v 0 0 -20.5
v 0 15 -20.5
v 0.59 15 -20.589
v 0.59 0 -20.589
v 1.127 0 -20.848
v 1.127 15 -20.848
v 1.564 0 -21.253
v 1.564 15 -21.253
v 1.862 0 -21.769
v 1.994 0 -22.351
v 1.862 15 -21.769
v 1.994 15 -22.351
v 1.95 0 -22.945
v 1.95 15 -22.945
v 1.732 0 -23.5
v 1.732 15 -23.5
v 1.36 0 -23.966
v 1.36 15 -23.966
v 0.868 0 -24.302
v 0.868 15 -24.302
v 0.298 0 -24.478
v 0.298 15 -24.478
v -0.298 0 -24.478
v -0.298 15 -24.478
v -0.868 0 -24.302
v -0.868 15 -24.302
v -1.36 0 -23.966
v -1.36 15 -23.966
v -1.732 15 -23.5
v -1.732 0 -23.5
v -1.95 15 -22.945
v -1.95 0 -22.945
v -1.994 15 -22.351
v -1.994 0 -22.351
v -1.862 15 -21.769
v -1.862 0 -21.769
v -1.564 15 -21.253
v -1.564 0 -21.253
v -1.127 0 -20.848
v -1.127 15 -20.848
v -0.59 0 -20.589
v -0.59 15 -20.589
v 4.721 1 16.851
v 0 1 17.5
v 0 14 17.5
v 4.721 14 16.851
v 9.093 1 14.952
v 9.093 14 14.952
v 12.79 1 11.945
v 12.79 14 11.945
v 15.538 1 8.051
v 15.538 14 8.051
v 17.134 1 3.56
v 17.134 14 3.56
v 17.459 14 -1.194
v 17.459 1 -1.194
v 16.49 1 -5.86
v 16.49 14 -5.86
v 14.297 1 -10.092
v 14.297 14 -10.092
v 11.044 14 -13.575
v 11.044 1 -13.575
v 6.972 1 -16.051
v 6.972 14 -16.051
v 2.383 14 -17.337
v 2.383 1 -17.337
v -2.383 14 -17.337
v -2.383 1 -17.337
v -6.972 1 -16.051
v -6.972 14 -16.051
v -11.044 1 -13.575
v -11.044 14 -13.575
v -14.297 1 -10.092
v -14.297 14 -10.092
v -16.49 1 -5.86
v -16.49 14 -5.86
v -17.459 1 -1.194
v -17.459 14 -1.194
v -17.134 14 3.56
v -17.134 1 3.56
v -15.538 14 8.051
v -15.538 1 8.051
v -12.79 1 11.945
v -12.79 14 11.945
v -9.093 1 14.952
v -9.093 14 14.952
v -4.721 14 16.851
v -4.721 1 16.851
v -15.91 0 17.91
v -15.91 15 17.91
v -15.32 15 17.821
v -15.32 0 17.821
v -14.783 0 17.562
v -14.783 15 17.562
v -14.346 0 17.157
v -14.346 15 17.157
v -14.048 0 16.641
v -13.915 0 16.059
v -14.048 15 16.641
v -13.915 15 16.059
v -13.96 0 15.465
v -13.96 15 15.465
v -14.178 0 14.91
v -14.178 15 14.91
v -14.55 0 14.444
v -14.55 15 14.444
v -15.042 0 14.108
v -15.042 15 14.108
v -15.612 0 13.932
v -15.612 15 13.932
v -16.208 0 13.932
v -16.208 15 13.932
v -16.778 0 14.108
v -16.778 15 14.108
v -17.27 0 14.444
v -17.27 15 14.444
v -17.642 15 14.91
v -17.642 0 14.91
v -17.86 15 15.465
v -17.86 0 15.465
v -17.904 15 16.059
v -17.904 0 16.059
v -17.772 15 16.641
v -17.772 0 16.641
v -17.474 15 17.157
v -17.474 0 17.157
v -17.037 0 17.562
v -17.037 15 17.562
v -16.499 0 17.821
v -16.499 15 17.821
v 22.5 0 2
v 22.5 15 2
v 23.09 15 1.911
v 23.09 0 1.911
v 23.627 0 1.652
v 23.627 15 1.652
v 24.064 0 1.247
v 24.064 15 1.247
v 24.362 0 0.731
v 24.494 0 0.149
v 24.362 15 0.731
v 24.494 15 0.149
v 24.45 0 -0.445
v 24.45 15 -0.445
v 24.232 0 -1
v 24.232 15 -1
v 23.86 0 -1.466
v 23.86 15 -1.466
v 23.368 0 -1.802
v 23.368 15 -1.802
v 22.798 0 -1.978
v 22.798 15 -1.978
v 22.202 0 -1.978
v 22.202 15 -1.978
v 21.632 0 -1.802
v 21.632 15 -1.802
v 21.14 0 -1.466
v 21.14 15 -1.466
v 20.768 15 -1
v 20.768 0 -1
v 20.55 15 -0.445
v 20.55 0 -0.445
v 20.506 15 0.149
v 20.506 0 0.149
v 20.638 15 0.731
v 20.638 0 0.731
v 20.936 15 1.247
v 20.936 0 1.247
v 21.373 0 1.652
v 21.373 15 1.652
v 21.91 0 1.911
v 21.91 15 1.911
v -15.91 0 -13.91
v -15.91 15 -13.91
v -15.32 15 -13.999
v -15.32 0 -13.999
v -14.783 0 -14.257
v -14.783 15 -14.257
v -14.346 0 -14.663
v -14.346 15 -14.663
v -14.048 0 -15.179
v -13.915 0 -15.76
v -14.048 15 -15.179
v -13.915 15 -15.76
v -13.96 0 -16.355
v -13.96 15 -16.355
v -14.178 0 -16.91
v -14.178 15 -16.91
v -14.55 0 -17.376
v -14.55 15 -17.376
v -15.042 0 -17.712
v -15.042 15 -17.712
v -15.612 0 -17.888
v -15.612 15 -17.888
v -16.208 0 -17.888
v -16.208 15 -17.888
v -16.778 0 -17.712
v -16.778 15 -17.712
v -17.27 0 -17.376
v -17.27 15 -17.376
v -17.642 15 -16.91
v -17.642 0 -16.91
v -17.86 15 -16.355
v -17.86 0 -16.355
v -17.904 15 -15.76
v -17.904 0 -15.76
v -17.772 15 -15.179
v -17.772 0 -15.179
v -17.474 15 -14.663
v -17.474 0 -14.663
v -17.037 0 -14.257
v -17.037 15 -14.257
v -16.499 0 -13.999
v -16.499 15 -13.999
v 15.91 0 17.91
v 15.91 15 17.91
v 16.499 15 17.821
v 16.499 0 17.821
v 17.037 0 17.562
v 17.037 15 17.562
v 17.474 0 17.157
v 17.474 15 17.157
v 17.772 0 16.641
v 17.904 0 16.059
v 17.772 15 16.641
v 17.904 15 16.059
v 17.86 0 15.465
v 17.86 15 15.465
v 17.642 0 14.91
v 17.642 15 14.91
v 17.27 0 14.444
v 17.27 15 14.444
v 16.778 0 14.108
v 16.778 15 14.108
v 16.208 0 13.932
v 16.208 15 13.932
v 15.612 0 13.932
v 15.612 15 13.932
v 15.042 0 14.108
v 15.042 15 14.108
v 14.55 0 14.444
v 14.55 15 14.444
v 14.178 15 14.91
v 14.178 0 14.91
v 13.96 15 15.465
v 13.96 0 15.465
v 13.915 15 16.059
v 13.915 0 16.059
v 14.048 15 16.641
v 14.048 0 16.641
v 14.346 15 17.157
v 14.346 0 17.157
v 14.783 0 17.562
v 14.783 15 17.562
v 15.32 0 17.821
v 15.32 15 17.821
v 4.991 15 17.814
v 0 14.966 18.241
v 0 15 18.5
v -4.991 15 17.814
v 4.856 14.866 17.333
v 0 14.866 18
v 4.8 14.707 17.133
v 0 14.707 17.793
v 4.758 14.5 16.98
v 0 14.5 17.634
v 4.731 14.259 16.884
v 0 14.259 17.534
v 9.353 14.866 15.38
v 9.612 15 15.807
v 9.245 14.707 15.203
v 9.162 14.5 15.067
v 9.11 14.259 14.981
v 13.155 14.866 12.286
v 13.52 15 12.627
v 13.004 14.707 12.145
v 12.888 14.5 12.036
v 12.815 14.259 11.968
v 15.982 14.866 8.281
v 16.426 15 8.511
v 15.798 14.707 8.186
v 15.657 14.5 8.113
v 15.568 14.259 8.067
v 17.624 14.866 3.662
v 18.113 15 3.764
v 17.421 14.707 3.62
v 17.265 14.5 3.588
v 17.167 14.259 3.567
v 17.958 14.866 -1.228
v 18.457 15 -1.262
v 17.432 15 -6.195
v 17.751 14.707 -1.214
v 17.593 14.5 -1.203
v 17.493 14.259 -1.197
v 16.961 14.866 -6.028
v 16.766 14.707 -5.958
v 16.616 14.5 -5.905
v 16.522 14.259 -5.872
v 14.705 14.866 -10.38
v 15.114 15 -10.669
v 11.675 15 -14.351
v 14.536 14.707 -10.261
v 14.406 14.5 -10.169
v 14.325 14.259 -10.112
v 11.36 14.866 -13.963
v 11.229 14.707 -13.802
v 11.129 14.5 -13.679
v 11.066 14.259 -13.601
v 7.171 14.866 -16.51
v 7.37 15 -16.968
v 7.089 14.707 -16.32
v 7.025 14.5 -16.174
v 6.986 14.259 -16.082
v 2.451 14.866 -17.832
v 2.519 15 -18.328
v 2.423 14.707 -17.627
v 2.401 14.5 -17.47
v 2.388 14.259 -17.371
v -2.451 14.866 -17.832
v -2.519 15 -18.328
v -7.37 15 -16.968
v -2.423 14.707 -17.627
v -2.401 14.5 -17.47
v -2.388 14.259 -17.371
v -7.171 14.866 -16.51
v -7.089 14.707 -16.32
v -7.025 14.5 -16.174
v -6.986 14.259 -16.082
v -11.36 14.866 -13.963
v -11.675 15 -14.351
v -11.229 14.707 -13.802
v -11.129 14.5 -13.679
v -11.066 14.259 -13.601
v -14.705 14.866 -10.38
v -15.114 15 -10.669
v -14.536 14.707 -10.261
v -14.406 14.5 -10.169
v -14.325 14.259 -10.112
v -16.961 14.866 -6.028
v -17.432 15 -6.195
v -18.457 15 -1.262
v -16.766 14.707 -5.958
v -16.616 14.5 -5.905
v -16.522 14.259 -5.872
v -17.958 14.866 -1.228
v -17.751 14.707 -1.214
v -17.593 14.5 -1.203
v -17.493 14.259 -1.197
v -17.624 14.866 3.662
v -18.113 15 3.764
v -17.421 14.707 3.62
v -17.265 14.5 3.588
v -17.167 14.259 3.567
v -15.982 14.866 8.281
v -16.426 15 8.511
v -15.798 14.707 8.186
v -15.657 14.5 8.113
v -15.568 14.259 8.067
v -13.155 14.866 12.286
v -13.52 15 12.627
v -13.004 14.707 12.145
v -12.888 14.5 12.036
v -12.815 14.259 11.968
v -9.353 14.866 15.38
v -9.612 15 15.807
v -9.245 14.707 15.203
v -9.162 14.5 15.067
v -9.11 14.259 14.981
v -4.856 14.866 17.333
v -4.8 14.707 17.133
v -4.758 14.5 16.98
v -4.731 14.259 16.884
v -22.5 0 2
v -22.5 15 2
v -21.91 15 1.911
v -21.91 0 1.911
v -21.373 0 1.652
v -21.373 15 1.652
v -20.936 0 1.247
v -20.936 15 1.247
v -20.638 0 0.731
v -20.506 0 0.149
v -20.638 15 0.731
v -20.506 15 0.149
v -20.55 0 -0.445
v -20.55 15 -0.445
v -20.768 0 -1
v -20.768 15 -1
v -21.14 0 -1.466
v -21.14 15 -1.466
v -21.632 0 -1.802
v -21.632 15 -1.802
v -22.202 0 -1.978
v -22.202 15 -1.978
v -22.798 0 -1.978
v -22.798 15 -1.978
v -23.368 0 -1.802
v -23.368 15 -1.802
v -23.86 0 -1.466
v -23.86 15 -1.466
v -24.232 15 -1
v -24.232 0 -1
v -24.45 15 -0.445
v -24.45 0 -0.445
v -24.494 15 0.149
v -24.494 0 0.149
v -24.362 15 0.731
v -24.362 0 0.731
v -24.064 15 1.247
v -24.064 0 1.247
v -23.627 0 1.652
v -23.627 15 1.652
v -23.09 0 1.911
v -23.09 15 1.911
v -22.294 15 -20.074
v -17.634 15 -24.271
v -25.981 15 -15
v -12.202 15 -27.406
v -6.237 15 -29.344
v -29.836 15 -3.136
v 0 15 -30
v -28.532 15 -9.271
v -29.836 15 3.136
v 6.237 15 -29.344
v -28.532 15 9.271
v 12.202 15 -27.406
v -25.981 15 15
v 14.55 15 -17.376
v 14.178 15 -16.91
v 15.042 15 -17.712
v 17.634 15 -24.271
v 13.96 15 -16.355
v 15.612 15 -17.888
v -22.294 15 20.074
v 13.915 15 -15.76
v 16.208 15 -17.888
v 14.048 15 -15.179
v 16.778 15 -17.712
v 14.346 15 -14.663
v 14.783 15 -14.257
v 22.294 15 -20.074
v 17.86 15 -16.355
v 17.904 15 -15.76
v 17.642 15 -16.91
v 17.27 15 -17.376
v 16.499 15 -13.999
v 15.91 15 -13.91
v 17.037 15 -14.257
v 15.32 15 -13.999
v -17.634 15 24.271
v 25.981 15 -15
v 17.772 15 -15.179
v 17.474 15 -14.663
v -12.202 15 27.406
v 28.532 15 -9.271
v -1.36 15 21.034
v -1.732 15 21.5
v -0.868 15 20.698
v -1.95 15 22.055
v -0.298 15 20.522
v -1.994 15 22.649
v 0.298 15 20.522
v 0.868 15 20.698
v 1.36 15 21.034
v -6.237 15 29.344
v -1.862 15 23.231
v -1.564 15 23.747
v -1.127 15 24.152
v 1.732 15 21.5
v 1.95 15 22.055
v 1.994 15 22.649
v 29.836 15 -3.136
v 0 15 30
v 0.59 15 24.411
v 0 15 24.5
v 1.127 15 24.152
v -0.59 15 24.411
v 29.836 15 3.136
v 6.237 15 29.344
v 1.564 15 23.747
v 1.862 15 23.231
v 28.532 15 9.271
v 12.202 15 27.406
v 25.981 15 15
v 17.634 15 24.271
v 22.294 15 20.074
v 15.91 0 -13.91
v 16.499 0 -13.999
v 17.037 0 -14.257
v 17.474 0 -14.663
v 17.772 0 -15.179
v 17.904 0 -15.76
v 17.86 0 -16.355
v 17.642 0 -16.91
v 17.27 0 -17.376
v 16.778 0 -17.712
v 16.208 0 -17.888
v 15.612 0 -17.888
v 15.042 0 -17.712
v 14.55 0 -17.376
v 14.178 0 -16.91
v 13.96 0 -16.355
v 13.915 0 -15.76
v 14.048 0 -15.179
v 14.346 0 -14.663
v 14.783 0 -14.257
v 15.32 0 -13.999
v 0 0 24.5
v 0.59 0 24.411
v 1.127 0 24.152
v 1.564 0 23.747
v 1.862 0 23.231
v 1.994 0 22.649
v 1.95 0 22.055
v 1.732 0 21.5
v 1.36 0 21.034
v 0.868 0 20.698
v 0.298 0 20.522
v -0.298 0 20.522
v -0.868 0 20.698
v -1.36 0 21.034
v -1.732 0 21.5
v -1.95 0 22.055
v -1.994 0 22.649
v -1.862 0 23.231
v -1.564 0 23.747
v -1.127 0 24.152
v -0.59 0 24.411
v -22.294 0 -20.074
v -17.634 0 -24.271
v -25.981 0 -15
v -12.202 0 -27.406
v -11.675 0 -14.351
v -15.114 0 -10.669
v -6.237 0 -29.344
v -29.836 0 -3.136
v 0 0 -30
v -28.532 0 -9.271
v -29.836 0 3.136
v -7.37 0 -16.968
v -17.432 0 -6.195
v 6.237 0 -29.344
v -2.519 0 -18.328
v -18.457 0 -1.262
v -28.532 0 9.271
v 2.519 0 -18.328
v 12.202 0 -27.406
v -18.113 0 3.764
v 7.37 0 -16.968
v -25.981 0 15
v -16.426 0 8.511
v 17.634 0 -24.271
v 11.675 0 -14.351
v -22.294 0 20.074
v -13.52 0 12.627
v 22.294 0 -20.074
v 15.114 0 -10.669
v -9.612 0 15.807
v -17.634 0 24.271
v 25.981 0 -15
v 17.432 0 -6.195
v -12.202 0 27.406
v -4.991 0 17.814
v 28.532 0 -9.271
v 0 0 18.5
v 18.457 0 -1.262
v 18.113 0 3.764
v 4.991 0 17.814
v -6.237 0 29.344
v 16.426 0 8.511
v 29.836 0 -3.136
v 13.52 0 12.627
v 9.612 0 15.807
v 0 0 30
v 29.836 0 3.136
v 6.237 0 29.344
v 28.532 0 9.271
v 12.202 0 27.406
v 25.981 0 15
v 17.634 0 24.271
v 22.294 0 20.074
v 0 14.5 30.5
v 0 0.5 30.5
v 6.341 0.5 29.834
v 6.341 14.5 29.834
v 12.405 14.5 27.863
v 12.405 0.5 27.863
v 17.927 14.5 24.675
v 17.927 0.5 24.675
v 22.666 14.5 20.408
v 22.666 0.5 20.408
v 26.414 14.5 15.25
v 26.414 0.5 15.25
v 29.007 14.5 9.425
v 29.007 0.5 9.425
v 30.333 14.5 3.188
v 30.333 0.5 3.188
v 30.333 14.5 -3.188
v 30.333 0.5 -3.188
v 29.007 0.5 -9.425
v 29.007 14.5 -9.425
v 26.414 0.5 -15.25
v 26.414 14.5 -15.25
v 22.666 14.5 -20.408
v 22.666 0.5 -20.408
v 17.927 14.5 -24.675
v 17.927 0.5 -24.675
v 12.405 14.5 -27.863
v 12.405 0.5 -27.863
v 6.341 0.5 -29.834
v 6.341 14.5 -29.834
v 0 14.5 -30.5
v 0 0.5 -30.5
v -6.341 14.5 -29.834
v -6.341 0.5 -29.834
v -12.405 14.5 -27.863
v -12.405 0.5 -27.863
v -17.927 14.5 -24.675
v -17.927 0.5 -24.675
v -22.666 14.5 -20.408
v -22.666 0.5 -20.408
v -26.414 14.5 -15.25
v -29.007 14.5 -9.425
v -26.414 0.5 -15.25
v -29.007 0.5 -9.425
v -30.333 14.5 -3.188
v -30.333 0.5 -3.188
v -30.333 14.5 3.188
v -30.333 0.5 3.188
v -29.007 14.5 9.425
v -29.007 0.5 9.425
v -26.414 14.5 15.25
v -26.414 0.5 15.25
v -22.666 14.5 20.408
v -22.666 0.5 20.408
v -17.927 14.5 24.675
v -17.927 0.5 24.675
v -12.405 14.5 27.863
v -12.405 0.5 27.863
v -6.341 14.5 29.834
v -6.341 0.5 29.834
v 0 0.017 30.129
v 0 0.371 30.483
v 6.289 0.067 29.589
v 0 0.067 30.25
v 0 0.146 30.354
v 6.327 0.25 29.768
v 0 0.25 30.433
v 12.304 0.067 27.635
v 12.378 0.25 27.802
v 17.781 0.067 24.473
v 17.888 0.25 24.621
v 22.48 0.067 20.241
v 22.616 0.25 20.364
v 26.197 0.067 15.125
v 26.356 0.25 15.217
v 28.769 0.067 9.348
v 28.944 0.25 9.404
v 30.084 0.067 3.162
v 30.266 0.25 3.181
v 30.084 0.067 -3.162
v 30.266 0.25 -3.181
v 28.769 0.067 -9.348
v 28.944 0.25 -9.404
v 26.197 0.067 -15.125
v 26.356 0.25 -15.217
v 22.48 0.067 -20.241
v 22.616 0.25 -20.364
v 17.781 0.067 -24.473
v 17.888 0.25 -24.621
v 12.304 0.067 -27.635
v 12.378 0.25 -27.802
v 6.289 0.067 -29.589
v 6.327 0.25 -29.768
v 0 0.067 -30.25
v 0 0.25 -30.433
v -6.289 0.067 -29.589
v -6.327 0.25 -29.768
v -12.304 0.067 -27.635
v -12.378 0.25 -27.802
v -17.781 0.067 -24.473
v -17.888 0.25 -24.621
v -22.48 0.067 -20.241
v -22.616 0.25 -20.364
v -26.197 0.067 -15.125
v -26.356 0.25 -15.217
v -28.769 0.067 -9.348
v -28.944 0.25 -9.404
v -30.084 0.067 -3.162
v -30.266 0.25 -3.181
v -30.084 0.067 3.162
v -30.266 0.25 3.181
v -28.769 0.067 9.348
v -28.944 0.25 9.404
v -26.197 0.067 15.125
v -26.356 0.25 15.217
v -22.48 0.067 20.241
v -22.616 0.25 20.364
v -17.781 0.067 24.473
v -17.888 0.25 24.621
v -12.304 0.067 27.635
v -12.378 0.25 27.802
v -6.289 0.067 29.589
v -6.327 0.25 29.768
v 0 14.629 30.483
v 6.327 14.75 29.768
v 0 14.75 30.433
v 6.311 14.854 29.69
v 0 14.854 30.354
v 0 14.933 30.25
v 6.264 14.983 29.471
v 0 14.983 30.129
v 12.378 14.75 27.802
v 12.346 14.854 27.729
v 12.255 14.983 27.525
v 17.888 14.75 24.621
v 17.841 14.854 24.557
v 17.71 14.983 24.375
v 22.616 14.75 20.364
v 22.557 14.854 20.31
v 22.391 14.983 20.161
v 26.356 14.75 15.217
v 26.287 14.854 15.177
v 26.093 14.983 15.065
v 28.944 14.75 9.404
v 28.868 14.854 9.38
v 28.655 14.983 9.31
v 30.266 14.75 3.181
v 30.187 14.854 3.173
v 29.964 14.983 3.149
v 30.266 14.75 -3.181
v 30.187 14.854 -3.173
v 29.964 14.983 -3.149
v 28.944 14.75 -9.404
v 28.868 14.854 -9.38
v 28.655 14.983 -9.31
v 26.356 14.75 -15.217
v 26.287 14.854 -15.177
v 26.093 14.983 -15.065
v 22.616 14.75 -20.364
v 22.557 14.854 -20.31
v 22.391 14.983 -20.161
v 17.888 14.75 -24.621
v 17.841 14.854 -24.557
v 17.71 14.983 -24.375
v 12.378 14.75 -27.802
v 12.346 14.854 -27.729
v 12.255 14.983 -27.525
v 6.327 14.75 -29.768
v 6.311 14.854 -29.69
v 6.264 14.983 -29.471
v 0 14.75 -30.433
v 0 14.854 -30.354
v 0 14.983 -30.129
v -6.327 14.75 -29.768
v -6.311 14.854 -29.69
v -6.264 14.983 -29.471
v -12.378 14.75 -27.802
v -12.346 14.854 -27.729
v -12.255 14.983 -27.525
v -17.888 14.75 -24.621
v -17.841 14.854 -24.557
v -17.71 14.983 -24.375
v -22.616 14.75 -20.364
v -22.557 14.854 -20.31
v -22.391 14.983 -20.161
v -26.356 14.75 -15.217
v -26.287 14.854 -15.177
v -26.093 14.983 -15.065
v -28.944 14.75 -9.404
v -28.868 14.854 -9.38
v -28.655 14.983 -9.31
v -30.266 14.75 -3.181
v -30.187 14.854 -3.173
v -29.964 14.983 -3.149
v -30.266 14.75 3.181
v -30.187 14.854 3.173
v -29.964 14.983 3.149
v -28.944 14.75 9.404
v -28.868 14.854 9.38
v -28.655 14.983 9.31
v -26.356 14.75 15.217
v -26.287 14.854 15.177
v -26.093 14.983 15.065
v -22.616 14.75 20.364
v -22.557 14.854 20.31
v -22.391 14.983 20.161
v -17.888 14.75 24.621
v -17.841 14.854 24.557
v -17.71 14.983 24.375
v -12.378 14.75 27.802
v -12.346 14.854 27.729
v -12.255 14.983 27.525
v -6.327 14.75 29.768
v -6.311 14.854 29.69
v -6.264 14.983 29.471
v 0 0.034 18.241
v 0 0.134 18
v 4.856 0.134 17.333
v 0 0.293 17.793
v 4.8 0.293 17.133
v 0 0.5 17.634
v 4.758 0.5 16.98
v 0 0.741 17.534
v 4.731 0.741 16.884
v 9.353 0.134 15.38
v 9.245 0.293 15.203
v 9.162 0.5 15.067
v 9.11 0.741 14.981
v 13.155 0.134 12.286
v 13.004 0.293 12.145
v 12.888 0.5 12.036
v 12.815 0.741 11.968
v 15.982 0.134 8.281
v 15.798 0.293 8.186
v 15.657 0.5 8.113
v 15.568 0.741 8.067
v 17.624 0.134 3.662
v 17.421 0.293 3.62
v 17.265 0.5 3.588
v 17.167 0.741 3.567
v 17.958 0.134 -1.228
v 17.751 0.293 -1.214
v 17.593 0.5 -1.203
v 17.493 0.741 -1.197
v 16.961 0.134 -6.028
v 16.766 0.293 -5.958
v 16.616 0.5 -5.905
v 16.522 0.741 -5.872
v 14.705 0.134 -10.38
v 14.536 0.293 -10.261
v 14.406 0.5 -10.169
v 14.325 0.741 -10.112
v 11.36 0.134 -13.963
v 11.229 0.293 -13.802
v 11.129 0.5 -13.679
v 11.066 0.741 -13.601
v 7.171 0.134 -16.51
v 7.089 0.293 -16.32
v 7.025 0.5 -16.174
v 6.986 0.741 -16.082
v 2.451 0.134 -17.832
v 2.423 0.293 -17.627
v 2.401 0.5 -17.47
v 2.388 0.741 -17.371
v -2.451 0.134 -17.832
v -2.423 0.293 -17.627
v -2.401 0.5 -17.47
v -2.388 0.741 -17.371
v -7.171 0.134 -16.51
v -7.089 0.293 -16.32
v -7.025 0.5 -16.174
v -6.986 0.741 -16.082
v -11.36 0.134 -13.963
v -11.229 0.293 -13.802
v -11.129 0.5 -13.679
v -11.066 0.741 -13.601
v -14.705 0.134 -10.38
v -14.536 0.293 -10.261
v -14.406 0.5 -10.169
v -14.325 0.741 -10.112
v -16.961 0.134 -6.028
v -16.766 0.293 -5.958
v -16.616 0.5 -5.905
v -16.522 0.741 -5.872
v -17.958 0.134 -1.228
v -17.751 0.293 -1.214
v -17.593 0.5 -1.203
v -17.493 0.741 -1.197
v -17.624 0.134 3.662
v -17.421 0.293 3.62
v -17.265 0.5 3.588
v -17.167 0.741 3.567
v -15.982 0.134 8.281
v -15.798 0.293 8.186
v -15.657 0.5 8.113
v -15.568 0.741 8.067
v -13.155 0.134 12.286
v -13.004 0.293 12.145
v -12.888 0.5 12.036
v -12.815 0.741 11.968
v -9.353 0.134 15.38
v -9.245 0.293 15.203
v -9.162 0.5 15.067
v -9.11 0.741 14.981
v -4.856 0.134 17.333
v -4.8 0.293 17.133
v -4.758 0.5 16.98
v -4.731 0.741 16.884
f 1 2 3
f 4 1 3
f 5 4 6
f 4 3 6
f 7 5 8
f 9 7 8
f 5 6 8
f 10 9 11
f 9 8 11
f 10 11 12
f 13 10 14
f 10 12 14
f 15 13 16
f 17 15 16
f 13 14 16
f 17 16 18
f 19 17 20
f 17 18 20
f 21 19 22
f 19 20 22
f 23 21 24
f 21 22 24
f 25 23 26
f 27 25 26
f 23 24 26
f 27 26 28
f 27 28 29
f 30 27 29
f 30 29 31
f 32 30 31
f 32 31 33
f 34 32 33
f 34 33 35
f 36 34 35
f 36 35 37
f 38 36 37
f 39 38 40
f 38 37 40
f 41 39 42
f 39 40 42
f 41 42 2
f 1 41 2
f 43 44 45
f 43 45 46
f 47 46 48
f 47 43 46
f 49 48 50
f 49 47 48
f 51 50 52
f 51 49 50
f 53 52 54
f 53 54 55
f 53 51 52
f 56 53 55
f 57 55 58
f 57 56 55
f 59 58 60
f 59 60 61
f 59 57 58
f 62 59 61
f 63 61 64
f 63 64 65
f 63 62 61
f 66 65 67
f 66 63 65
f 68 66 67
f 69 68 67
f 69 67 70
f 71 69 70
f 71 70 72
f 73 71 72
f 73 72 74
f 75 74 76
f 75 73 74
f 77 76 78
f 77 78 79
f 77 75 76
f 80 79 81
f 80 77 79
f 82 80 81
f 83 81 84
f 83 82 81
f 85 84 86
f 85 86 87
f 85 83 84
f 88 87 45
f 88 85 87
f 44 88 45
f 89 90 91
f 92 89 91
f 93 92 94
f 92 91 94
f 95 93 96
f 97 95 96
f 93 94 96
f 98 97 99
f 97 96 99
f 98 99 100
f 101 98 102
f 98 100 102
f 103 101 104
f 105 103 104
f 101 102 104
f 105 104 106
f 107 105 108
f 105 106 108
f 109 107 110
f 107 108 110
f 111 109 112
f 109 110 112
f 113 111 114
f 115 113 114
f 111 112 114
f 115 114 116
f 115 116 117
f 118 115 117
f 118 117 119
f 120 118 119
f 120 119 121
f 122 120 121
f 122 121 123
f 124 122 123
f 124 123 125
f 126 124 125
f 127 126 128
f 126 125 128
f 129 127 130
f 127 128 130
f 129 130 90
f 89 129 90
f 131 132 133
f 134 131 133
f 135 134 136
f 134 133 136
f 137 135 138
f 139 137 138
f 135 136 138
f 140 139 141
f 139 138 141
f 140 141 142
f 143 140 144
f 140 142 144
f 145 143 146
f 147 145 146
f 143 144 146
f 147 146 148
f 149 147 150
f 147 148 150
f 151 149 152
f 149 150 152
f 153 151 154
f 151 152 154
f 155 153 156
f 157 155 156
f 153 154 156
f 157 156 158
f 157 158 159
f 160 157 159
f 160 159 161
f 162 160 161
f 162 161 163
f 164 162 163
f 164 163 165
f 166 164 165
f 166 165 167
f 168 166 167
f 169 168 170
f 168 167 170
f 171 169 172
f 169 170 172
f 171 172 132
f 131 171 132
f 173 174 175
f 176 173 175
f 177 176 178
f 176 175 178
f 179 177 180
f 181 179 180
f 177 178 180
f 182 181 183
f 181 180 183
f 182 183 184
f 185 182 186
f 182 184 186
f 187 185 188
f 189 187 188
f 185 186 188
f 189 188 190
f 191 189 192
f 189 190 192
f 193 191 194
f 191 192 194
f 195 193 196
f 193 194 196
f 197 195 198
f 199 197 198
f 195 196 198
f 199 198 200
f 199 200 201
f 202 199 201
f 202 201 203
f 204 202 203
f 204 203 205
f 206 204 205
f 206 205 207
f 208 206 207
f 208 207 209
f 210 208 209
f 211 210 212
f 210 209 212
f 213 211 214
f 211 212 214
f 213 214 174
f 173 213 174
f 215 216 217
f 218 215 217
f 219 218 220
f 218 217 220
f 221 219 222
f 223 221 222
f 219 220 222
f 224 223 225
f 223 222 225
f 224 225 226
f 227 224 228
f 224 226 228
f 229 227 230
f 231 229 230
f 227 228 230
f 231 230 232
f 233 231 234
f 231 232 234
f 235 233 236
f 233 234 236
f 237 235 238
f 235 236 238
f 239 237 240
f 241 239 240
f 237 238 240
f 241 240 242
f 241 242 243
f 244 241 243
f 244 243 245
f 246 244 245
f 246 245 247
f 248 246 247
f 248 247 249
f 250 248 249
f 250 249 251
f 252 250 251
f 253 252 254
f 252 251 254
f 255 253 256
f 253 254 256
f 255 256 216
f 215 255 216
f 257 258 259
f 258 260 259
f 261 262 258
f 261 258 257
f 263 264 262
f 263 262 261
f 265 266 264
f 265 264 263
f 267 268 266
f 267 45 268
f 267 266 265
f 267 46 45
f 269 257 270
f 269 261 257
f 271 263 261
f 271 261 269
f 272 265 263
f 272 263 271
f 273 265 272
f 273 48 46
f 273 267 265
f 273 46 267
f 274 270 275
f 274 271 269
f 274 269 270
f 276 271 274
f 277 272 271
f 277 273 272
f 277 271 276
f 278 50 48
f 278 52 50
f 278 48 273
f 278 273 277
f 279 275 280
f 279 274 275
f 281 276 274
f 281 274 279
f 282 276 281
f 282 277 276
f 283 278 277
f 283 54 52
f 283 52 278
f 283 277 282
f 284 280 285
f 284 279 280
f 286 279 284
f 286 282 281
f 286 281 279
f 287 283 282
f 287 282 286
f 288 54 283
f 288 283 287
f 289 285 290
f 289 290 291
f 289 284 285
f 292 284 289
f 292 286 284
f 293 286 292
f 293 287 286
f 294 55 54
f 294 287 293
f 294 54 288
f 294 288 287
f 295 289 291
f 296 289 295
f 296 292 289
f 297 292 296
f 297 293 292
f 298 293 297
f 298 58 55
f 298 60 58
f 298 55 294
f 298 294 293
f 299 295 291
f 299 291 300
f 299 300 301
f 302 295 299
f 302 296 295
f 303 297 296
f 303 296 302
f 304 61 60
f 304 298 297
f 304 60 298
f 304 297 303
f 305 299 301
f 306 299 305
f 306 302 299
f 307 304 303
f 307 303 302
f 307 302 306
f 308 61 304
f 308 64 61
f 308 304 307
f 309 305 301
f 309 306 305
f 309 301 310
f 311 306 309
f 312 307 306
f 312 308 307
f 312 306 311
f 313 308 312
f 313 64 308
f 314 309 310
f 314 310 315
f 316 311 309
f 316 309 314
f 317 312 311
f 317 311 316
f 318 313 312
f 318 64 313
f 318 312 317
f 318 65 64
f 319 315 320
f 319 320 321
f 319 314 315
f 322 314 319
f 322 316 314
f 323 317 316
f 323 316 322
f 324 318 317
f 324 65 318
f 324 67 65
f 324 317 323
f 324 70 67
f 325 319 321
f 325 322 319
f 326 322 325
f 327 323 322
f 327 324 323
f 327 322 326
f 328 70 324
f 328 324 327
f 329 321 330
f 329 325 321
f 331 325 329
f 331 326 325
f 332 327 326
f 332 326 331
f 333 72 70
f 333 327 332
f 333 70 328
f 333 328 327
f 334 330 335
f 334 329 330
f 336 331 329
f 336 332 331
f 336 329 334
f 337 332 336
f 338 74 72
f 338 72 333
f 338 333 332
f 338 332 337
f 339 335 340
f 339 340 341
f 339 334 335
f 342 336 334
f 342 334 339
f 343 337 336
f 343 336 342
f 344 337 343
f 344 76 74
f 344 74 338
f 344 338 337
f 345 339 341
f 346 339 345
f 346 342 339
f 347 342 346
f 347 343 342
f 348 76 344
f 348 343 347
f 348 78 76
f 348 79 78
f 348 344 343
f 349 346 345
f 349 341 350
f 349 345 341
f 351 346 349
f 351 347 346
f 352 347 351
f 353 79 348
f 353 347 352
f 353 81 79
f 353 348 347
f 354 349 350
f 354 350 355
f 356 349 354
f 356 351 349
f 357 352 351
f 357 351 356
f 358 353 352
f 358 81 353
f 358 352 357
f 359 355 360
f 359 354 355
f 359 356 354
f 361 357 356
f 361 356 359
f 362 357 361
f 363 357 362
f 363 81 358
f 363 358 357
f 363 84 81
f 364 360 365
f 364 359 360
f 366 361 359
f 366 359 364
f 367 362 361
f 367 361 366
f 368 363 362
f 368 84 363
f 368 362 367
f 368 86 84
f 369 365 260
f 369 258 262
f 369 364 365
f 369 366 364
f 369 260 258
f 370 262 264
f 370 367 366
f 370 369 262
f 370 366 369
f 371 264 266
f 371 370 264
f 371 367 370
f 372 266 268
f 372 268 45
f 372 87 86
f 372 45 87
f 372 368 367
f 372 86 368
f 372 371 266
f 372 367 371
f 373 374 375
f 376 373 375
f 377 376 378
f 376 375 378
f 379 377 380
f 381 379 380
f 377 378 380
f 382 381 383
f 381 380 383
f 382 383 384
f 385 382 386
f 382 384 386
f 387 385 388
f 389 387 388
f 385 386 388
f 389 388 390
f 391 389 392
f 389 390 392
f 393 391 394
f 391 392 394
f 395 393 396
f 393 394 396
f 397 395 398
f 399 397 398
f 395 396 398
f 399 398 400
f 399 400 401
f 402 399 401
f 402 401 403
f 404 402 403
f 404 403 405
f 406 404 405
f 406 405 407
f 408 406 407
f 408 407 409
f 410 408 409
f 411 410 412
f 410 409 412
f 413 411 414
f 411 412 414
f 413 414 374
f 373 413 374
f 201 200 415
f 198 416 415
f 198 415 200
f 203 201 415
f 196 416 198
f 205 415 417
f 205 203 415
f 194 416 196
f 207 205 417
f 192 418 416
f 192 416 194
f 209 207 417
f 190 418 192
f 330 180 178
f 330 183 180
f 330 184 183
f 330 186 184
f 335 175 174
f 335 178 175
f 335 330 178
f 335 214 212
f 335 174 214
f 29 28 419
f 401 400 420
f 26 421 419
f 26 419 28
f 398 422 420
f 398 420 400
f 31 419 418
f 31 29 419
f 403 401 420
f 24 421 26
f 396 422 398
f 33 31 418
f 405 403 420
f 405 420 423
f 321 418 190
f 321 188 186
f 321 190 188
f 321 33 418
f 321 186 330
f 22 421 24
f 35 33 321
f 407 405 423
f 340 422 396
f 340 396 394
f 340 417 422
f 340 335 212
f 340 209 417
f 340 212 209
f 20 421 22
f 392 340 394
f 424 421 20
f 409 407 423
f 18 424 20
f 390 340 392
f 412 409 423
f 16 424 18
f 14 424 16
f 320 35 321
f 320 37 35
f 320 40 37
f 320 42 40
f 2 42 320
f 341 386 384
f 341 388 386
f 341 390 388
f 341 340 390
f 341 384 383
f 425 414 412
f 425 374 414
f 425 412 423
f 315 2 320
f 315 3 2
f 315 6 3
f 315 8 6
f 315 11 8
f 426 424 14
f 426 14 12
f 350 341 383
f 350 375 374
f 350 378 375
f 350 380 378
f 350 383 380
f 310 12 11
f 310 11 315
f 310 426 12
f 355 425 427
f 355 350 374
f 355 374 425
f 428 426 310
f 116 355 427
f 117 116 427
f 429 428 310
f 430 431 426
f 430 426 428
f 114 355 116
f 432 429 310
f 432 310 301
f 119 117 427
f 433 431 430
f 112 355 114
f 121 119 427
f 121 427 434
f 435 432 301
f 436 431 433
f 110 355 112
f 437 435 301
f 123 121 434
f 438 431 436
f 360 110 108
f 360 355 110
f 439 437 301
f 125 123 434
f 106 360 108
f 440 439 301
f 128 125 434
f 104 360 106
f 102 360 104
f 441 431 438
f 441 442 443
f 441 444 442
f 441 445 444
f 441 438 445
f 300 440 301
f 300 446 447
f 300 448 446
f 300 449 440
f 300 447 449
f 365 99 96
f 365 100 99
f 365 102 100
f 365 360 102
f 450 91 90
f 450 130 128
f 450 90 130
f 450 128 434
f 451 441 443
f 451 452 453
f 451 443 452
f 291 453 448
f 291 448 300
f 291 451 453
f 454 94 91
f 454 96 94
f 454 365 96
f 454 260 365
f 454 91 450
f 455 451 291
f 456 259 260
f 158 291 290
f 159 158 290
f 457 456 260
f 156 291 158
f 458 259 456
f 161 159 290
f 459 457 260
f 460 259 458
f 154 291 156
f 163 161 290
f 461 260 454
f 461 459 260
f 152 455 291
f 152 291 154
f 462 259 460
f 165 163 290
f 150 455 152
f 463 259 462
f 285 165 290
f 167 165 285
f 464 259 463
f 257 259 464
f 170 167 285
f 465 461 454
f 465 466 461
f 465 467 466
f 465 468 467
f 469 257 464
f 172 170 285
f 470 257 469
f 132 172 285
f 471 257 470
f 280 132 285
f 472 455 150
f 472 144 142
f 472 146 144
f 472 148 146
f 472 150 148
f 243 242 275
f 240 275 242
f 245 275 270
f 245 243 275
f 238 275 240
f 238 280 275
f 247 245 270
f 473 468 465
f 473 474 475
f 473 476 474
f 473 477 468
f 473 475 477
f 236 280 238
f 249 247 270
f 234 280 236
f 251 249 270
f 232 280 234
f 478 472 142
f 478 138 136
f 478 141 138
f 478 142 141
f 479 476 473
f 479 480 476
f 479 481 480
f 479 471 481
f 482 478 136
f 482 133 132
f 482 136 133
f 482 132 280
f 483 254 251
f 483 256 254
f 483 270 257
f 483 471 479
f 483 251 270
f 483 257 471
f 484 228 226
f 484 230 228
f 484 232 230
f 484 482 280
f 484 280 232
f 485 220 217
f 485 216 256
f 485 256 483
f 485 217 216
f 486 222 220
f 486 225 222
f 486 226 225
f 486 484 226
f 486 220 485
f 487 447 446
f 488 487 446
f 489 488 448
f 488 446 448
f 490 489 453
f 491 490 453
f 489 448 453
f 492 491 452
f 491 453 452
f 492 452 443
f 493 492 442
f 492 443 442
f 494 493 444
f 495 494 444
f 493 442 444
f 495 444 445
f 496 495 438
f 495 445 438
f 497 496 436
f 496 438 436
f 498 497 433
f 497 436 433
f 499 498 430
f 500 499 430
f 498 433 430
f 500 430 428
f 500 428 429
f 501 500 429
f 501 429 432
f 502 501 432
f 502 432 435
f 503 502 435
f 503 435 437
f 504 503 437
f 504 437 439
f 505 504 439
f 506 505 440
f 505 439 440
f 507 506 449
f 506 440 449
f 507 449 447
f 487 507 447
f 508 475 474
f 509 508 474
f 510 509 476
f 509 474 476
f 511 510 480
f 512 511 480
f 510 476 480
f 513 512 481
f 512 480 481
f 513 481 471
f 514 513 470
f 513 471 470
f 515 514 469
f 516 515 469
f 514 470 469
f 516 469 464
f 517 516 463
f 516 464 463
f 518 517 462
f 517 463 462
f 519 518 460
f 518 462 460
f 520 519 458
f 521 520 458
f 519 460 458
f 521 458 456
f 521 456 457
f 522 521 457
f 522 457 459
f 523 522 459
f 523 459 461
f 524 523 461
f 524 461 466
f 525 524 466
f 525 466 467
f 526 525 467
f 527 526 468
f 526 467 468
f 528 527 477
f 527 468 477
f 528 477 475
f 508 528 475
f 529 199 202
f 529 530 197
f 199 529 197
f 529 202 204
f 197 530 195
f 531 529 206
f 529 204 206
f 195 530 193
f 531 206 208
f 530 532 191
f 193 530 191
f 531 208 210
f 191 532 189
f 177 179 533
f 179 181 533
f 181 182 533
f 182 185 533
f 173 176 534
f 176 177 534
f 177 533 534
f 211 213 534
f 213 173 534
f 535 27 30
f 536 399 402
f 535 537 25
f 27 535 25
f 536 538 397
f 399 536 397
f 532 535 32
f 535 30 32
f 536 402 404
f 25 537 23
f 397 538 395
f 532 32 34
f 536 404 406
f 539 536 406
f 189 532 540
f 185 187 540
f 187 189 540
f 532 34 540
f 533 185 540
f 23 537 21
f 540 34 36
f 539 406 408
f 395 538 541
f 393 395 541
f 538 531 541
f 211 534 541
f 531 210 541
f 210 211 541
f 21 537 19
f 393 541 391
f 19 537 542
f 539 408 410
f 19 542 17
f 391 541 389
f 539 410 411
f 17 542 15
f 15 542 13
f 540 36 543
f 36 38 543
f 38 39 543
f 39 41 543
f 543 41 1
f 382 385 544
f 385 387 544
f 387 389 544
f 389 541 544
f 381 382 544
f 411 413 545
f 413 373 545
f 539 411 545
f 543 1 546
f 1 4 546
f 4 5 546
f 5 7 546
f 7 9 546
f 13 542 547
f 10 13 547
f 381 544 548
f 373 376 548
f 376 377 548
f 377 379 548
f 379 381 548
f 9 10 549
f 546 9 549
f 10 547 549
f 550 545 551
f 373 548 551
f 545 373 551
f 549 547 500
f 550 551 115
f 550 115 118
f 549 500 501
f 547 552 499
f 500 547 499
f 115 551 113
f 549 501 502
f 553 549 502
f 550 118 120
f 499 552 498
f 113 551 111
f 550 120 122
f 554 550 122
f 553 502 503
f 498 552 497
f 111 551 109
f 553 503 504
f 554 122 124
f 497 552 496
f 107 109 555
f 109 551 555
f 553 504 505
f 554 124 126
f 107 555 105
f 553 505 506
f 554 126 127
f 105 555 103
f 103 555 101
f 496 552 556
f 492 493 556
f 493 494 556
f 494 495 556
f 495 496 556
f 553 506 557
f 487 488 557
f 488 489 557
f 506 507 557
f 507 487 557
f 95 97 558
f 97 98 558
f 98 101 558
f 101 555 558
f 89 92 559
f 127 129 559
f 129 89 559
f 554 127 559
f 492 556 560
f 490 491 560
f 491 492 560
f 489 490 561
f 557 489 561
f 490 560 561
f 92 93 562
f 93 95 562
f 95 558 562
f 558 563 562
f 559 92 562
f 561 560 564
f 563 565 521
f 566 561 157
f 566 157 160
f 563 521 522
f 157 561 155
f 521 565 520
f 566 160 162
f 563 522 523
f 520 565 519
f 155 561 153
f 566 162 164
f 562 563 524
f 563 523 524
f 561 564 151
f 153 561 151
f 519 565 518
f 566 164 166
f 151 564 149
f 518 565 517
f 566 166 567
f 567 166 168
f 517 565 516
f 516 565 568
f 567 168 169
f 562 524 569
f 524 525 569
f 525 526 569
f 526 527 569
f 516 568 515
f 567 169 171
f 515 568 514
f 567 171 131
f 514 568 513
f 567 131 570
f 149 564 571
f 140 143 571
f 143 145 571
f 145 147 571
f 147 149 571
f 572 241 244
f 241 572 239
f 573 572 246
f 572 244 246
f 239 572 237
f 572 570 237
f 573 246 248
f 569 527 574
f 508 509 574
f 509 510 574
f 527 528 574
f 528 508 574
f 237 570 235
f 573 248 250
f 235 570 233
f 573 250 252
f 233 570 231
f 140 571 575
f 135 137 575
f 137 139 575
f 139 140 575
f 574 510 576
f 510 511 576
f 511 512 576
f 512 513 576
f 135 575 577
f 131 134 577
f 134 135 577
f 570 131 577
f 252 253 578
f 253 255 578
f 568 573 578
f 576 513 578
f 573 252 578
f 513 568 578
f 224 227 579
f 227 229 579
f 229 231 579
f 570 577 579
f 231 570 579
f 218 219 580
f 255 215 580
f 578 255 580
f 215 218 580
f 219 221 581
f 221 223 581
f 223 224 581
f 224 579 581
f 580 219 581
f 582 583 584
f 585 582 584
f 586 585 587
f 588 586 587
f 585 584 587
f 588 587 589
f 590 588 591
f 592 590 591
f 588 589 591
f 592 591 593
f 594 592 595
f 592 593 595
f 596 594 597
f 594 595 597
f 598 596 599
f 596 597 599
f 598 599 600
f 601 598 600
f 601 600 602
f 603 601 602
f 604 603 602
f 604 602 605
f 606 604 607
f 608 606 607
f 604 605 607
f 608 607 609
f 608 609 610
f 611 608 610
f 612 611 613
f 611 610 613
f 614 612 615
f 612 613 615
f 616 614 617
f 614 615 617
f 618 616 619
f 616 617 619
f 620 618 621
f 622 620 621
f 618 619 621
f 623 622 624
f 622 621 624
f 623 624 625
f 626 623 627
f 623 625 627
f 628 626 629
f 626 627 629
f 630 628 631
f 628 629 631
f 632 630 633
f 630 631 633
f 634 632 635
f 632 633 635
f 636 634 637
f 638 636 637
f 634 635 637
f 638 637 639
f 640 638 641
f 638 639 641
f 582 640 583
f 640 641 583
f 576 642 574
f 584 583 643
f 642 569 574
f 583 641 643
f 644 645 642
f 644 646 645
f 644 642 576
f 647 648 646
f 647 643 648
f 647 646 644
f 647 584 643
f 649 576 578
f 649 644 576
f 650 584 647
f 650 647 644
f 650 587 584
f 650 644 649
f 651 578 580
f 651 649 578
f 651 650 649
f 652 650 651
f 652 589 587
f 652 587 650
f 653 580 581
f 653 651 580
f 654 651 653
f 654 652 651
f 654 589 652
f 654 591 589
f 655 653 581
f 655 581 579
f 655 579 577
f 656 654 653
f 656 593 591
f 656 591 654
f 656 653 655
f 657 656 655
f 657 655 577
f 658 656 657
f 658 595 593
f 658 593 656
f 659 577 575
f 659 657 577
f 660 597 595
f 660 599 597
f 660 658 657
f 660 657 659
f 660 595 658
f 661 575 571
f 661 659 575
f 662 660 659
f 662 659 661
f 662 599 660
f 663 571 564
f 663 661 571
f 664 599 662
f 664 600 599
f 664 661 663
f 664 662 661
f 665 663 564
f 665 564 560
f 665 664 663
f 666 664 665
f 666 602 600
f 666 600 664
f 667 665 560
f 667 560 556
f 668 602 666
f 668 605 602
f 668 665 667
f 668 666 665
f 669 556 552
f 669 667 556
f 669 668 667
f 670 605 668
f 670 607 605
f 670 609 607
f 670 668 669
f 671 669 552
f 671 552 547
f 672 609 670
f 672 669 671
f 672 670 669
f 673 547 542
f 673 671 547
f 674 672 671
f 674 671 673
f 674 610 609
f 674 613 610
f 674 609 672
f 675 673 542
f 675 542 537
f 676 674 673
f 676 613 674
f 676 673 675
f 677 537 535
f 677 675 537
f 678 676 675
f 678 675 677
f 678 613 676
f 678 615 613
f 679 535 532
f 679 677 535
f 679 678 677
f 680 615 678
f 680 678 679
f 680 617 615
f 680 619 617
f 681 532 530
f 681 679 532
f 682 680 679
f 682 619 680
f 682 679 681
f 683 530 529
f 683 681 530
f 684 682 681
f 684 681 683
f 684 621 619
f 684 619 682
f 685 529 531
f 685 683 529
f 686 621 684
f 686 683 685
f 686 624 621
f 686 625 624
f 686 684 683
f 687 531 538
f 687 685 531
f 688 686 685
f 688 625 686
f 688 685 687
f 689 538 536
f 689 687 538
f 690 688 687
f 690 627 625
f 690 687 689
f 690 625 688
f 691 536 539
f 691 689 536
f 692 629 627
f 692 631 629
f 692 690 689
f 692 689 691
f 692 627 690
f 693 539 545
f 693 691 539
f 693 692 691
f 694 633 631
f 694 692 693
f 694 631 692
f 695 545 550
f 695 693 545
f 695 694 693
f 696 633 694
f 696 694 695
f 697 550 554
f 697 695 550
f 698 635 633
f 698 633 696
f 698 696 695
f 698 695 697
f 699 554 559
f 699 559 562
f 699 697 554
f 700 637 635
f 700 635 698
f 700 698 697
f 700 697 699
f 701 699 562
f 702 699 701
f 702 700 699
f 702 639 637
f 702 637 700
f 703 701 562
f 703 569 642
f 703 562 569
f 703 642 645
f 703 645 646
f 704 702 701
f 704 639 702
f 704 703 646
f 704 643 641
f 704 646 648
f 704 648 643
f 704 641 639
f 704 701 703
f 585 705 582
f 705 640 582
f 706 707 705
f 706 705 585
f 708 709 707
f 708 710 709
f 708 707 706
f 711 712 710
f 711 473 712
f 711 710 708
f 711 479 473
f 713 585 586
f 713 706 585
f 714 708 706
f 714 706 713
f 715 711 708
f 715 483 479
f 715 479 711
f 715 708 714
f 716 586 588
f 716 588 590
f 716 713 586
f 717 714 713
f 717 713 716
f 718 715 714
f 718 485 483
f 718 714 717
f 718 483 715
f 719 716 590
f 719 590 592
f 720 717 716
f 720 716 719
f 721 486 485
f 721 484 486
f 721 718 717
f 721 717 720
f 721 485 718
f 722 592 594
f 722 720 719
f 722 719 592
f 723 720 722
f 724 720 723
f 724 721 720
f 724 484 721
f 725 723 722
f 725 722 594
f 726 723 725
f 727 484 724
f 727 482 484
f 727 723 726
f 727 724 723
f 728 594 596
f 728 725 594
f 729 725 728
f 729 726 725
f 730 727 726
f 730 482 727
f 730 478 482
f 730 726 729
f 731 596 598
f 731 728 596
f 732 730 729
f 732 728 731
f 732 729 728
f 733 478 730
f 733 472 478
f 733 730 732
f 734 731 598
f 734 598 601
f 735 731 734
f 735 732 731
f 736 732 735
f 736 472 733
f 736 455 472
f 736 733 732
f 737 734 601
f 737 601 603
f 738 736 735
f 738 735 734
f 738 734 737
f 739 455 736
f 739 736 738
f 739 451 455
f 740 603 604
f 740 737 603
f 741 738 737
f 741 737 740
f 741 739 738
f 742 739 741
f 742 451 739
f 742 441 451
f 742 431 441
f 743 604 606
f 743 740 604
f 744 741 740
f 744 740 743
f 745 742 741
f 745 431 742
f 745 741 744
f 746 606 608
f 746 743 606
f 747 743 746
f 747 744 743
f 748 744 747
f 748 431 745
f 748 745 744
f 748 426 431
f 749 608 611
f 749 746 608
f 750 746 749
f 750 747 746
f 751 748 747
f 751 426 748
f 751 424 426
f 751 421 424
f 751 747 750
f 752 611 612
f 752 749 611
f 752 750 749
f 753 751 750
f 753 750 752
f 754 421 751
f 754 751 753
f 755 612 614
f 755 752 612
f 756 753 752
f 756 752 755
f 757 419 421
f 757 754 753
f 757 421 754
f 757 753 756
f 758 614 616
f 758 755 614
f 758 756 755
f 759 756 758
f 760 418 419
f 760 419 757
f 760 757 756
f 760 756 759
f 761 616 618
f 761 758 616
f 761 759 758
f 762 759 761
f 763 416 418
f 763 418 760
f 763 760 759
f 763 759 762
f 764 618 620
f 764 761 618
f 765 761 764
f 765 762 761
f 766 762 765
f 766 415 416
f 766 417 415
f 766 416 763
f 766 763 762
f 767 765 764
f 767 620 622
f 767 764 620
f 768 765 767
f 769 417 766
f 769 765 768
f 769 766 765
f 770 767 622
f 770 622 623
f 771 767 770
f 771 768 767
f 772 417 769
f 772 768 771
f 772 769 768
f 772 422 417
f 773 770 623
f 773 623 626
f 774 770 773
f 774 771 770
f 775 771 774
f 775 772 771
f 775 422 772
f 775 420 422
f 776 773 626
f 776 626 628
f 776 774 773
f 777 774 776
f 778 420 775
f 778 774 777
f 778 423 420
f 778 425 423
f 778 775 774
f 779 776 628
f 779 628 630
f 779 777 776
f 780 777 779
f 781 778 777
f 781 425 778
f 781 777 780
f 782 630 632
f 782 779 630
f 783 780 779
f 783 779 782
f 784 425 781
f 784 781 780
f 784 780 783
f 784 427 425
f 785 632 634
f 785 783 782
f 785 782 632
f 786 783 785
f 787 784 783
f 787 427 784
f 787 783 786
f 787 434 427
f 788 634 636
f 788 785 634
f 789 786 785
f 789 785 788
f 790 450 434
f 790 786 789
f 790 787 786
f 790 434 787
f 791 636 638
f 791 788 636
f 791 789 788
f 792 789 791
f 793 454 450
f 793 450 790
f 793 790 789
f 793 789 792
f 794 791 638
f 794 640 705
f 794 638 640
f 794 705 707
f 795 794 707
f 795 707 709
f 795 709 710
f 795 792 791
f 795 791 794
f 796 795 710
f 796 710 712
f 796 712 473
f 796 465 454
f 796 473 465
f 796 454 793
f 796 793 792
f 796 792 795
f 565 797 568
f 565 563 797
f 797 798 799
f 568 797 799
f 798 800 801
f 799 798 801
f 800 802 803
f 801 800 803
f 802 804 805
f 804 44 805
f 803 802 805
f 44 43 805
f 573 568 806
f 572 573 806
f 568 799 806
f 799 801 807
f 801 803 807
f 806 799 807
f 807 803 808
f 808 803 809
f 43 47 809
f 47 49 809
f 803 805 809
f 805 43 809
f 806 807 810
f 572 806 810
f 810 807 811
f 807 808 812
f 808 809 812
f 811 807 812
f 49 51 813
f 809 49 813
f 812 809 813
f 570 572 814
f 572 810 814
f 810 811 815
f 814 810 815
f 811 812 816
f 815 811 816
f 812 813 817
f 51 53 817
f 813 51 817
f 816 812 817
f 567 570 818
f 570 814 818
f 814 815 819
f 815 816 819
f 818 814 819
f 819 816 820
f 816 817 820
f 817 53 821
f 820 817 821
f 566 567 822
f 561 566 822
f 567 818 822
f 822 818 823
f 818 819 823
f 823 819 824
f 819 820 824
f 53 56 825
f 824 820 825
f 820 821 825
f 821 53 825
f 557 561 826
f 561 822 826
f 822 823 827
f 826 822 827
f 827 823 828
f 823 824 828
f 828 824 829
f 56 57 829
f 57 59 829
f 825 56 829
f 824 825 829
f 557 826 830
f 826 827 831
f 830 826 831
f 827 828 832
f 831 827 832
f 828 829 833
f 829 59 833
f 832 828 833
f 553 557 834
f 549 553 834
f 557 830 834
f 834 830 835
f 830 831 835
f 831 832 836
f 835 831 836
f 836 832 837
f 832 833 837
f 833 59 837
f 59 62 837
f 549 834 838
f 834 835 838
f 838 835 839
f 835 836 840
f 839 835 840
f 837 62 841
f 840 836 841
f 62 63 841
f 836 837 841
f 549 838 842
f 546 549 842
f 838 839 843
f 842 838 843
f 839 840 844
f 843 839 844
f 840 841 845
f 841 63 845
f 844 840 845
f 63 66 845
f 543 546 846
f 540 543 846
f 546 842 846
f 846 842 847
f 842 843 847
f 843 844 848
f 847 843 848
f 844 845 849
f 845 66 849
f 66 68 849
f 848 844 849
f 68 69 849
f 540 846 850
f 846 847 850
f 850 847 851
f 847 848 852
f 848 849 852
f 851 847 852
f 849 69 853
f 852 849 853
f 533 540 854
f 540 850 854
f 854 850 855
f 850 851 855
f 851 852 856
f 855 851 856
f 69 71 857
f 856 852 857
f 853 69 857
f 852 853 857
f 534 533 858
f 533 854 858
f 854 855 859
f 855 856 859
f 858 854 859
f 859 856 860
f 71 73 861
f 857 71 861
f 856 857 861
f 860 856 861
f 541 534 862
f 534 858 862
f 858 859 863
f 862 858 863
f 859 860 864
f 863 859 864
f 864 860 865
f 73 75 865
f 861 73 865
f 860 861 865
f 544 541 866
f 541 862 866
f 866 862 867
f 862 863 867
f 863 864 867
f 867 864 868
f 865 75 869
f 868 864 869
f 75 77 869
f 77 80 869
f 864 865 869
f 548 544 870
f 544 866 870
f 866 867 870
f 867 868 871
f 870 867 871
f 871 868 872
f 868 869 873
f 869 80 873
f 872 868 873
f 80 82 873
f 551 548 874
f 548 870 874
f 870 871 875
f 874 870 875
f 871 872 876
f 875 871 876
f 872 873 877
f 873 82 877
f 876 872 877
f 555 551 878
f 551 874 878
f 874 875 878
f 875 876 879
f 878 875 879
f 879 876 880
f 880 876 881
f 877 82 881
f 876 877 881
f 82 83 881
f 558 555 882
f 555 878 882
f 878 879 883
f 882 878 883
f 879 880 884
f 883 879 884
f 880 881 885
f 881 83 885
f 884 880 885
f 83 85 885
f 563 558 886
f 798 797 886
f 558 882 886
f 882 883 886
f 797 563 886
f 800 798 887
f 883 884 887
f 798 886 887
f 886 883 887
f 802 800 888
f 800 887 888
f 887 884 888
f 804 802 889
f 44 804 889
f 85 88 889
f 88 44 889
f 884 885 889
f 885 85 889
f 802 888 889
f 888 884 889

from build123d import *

# Parameters (mm, degrees)
SKETCH1_R           = 30.5
SKETCH1_R_2         = 17.5
BOSS_EXTRUDE1_DEPTH = 15
SKETCH2_R           = 2
CUT_EXTRUDE1_DEPTH  = 15
FILLET1_R           = 1
FILLET2_R           = 0.5


with BuildPart() as part:
    # Sketch1 → Boss-Extrude1 (new body)
    with BuildSketch(Plane(origin=(0, 0, 0), x_dir=(1, 0, 0), z_dir=(0, 1, 0))):
        with Locations(Location((0, 0, 0), (0, 0, 270))):
            Circle(SKETCH1_R)
        with Locations(Location((0, 0, 0), (0, 0, 270))):
            Circle(SKETCH1_R_2, mode=Mode.SUBTRACT)
    extrude(amount=BOSS_EXTRUDE1_DEPTH)

    # Sketch2 → Cut-Extrude1 (cut)
    with BuildSketch(Plane(origin=(0, 15, 0), x_dir=(1, 0, 0), z_dir=(0, 1, 0))):
        with Locations(Location((0, 22.5, 0), (0, 0, 270))):
            Circle(SKETCH2_R)
        with Locations(Location((15.909902577, 15.909902577, 0), (0, 0, 270))):
            Circle(SKETCH2_R)
        with Locations(Location((22.5, 0, 0), (0, 0, 270))):
            Circle(SKETCH2_R)
        with Locations(Location((15.909902577, -15.909902577, 0), (0, 0, 270))):
            Circle(SKETCH2_R)
        with Locations(Location((0, -22.5, 0), (0, 0, 270))):
            Circle(SKETCH2_R)
        with Locations(Location((-15.909902577, -15.909902577, 0), (0, 0, 270))):
            Circle(SKETCH2_R)
        with Locations(Location((-22.5, 0, 0), (0, 0, 270))):
            Circle(SKETCH2_R)
        with Locations(Location((-15.909902577, 15.909902577, 0), (0, 0, 270))):
            Circle(SKETCH2_R)
    extrude(amount=-CUT_EXTRUDE1_DEPTH, mode=Mode.SUBTRACT)

    # Fillet1
    fillet1_edges = [part.edges().sort_by_distance(p)[0] for p in [
        (0, 0, -17.5),
        (0, 15, -17.5),
    ]]
    fillet(fillet1_edges, radius=FILLET1_R)

    # Fillet2
    fillet2_edges = [part.edges().sort_by_distance(p)[0] for p in [
        (0, 0, -30.5),
        (0, 15, -30.5),
    ]]
    fillet(fillet2_edges, radius=FILLET2_R)


solid = part.part
